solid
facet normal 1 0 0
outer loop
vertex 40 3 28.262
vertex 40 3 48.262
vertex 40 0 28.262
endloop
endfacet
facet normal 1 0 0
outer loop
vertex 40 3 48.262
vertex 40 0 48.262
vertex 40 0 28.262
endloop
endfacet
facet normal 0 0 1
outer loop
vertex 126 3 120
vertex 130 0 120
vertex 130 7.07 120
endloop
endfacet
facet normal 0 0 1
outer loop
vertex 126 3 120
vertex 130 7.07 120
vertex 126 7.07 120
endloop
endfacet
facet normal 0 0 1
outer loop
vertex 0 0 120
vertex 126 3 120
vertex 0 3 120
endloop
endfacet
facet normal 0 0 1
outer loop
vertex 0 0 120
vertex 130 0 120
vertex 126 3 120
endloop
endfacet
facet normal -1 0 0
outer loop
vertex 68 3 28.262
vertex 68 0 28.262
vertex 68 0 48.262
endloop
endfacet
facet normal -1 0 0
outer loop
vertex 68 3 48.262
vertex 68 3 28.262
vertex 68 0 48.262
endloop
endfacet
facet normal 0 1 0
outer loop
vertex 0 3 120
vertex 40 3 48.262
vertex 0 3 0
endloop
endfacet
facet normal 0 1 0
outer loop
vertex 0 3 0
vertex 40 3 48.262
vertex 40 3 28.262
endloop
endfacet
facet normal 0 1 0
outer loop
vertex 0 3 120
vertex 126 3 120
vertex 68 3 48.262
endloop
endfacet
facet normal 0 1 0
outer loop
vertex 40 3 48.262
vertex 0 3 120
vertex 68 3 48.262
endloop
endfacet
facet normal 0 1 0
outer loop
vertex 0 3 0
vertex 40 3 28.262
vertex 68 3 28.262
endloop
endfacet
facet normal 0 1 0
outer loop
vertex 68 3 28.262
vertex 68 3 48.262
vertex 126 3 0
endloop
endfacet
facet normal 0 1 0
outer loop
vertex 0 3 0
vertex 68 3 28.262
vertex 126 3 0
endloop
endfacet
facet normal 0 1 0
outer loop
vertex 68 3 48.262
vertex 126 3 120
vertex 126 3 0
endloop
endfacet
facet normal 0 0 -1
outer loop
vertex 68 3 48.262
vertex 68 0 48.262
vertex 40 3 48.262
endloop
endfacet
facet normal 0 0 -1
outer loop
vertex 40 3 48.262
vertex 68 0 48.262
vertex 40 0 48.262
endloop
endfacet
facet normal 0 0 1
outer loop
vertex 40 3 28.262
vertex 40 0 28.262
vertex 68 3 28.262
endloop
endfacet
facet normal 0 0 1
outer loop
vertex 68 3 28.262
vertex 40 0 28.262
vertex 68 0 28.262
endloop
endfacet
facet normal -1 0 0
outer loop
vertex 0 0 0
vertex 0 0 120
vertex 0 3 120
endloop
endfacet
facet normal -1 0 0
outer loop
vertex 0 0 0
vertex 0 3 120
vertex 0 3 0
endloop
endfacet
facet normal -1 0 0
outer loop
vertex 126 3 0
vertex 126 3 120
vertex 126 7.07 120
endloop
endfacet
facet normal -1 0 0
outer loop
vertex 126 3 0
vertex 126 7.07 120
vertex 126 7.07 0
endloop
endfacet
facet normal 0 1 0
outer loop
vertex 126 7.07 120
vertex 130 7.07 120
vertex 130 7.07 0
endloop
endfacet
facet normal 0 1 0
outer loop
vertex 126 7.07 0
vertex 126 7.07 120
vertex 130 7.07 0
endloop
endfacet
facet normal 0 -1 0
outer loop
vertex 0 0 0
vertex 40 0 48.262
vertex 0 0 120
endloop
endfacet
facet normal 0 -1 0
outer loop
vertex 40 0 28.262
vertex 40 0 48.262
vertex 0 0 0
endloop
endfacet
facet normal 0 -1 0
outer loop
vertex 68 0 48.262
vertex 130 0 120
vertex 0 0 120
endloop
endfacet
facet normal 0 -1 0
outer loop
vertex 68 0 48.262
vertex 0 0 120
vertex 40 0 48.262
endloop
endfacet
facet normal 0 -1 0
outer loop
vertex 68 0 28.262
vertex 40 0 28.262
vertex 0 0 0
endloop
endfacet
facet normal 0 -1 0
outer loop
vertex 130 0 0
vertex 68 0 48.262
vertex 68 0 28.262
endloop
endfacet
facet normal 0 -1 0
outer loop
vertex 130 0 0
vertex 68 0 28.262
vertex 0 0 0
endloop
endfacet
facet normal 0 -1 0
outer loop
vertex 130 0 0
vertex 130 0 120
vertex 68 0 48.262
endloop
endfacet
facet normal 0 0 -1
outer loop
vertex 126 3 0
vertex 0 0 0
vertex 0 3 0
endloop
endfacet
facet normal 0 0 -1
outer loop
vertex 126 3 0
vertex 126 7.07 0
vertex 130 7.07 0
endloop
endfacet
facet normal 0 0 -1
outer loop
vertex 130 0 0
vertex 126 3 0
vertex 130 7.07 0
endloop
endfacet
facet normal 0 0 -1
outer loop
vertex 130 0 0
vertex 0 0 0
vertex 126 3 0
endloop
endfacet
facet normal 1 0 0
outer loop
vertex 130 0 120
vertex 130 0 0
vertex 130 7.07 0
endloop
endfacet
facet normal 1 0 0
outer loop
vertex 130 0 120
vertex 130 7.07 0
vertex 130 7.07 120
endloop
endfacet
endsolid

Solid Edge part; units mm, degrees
sketch "Sketch1" plane through (0, 0, 0) normal (0, -1, 0) x (1, 0, 0)
  line L0 (130, 0) -> (130, 120)
  line L1 (130, 120) -> (0, 120)
  line L2 (0, 120) -> (0, 0)
  line L3 (0, 0) -> (130, 0)
extrude "Protrusion1" add sketch "Sketch1" against normal blind 3
sketch "Sketch2" plane through (66.405, 0, 60) normal (0, -1, 0) x (1, 0, 0)
  line L0 (59.595, 60) -> (59.595, -60)
  line L1 (59.595, -60) -> (63.595, -60)
  line L2 (63.595, -60) -> (63.595, 60)
  line L3 (63.595, 60) -> (59.595, 60)
extrude "Protrusão_Extrudada_2" add sketch "Sketch2" against normal blind 7.0697
sketch "Sketch3" plane through (66.405, 0, 60) normal (0, -1, 0) x (1, 0, 0)
  line L0 (1.595, -11.7379) -> (-26.405, -11.7379)
  line L1 (-26.405, -11.7379) -> (-26.405, -31.7379)
  line L2 (-26.405, -31.7379) -> (1.595, -31.7379)
  line L3 (1.595, -31.7379) -> (1.595, -11.7379)
extrude "Recorte_Extrudado_2" cut sketch "Sketch3" against normal blind 60.6919
